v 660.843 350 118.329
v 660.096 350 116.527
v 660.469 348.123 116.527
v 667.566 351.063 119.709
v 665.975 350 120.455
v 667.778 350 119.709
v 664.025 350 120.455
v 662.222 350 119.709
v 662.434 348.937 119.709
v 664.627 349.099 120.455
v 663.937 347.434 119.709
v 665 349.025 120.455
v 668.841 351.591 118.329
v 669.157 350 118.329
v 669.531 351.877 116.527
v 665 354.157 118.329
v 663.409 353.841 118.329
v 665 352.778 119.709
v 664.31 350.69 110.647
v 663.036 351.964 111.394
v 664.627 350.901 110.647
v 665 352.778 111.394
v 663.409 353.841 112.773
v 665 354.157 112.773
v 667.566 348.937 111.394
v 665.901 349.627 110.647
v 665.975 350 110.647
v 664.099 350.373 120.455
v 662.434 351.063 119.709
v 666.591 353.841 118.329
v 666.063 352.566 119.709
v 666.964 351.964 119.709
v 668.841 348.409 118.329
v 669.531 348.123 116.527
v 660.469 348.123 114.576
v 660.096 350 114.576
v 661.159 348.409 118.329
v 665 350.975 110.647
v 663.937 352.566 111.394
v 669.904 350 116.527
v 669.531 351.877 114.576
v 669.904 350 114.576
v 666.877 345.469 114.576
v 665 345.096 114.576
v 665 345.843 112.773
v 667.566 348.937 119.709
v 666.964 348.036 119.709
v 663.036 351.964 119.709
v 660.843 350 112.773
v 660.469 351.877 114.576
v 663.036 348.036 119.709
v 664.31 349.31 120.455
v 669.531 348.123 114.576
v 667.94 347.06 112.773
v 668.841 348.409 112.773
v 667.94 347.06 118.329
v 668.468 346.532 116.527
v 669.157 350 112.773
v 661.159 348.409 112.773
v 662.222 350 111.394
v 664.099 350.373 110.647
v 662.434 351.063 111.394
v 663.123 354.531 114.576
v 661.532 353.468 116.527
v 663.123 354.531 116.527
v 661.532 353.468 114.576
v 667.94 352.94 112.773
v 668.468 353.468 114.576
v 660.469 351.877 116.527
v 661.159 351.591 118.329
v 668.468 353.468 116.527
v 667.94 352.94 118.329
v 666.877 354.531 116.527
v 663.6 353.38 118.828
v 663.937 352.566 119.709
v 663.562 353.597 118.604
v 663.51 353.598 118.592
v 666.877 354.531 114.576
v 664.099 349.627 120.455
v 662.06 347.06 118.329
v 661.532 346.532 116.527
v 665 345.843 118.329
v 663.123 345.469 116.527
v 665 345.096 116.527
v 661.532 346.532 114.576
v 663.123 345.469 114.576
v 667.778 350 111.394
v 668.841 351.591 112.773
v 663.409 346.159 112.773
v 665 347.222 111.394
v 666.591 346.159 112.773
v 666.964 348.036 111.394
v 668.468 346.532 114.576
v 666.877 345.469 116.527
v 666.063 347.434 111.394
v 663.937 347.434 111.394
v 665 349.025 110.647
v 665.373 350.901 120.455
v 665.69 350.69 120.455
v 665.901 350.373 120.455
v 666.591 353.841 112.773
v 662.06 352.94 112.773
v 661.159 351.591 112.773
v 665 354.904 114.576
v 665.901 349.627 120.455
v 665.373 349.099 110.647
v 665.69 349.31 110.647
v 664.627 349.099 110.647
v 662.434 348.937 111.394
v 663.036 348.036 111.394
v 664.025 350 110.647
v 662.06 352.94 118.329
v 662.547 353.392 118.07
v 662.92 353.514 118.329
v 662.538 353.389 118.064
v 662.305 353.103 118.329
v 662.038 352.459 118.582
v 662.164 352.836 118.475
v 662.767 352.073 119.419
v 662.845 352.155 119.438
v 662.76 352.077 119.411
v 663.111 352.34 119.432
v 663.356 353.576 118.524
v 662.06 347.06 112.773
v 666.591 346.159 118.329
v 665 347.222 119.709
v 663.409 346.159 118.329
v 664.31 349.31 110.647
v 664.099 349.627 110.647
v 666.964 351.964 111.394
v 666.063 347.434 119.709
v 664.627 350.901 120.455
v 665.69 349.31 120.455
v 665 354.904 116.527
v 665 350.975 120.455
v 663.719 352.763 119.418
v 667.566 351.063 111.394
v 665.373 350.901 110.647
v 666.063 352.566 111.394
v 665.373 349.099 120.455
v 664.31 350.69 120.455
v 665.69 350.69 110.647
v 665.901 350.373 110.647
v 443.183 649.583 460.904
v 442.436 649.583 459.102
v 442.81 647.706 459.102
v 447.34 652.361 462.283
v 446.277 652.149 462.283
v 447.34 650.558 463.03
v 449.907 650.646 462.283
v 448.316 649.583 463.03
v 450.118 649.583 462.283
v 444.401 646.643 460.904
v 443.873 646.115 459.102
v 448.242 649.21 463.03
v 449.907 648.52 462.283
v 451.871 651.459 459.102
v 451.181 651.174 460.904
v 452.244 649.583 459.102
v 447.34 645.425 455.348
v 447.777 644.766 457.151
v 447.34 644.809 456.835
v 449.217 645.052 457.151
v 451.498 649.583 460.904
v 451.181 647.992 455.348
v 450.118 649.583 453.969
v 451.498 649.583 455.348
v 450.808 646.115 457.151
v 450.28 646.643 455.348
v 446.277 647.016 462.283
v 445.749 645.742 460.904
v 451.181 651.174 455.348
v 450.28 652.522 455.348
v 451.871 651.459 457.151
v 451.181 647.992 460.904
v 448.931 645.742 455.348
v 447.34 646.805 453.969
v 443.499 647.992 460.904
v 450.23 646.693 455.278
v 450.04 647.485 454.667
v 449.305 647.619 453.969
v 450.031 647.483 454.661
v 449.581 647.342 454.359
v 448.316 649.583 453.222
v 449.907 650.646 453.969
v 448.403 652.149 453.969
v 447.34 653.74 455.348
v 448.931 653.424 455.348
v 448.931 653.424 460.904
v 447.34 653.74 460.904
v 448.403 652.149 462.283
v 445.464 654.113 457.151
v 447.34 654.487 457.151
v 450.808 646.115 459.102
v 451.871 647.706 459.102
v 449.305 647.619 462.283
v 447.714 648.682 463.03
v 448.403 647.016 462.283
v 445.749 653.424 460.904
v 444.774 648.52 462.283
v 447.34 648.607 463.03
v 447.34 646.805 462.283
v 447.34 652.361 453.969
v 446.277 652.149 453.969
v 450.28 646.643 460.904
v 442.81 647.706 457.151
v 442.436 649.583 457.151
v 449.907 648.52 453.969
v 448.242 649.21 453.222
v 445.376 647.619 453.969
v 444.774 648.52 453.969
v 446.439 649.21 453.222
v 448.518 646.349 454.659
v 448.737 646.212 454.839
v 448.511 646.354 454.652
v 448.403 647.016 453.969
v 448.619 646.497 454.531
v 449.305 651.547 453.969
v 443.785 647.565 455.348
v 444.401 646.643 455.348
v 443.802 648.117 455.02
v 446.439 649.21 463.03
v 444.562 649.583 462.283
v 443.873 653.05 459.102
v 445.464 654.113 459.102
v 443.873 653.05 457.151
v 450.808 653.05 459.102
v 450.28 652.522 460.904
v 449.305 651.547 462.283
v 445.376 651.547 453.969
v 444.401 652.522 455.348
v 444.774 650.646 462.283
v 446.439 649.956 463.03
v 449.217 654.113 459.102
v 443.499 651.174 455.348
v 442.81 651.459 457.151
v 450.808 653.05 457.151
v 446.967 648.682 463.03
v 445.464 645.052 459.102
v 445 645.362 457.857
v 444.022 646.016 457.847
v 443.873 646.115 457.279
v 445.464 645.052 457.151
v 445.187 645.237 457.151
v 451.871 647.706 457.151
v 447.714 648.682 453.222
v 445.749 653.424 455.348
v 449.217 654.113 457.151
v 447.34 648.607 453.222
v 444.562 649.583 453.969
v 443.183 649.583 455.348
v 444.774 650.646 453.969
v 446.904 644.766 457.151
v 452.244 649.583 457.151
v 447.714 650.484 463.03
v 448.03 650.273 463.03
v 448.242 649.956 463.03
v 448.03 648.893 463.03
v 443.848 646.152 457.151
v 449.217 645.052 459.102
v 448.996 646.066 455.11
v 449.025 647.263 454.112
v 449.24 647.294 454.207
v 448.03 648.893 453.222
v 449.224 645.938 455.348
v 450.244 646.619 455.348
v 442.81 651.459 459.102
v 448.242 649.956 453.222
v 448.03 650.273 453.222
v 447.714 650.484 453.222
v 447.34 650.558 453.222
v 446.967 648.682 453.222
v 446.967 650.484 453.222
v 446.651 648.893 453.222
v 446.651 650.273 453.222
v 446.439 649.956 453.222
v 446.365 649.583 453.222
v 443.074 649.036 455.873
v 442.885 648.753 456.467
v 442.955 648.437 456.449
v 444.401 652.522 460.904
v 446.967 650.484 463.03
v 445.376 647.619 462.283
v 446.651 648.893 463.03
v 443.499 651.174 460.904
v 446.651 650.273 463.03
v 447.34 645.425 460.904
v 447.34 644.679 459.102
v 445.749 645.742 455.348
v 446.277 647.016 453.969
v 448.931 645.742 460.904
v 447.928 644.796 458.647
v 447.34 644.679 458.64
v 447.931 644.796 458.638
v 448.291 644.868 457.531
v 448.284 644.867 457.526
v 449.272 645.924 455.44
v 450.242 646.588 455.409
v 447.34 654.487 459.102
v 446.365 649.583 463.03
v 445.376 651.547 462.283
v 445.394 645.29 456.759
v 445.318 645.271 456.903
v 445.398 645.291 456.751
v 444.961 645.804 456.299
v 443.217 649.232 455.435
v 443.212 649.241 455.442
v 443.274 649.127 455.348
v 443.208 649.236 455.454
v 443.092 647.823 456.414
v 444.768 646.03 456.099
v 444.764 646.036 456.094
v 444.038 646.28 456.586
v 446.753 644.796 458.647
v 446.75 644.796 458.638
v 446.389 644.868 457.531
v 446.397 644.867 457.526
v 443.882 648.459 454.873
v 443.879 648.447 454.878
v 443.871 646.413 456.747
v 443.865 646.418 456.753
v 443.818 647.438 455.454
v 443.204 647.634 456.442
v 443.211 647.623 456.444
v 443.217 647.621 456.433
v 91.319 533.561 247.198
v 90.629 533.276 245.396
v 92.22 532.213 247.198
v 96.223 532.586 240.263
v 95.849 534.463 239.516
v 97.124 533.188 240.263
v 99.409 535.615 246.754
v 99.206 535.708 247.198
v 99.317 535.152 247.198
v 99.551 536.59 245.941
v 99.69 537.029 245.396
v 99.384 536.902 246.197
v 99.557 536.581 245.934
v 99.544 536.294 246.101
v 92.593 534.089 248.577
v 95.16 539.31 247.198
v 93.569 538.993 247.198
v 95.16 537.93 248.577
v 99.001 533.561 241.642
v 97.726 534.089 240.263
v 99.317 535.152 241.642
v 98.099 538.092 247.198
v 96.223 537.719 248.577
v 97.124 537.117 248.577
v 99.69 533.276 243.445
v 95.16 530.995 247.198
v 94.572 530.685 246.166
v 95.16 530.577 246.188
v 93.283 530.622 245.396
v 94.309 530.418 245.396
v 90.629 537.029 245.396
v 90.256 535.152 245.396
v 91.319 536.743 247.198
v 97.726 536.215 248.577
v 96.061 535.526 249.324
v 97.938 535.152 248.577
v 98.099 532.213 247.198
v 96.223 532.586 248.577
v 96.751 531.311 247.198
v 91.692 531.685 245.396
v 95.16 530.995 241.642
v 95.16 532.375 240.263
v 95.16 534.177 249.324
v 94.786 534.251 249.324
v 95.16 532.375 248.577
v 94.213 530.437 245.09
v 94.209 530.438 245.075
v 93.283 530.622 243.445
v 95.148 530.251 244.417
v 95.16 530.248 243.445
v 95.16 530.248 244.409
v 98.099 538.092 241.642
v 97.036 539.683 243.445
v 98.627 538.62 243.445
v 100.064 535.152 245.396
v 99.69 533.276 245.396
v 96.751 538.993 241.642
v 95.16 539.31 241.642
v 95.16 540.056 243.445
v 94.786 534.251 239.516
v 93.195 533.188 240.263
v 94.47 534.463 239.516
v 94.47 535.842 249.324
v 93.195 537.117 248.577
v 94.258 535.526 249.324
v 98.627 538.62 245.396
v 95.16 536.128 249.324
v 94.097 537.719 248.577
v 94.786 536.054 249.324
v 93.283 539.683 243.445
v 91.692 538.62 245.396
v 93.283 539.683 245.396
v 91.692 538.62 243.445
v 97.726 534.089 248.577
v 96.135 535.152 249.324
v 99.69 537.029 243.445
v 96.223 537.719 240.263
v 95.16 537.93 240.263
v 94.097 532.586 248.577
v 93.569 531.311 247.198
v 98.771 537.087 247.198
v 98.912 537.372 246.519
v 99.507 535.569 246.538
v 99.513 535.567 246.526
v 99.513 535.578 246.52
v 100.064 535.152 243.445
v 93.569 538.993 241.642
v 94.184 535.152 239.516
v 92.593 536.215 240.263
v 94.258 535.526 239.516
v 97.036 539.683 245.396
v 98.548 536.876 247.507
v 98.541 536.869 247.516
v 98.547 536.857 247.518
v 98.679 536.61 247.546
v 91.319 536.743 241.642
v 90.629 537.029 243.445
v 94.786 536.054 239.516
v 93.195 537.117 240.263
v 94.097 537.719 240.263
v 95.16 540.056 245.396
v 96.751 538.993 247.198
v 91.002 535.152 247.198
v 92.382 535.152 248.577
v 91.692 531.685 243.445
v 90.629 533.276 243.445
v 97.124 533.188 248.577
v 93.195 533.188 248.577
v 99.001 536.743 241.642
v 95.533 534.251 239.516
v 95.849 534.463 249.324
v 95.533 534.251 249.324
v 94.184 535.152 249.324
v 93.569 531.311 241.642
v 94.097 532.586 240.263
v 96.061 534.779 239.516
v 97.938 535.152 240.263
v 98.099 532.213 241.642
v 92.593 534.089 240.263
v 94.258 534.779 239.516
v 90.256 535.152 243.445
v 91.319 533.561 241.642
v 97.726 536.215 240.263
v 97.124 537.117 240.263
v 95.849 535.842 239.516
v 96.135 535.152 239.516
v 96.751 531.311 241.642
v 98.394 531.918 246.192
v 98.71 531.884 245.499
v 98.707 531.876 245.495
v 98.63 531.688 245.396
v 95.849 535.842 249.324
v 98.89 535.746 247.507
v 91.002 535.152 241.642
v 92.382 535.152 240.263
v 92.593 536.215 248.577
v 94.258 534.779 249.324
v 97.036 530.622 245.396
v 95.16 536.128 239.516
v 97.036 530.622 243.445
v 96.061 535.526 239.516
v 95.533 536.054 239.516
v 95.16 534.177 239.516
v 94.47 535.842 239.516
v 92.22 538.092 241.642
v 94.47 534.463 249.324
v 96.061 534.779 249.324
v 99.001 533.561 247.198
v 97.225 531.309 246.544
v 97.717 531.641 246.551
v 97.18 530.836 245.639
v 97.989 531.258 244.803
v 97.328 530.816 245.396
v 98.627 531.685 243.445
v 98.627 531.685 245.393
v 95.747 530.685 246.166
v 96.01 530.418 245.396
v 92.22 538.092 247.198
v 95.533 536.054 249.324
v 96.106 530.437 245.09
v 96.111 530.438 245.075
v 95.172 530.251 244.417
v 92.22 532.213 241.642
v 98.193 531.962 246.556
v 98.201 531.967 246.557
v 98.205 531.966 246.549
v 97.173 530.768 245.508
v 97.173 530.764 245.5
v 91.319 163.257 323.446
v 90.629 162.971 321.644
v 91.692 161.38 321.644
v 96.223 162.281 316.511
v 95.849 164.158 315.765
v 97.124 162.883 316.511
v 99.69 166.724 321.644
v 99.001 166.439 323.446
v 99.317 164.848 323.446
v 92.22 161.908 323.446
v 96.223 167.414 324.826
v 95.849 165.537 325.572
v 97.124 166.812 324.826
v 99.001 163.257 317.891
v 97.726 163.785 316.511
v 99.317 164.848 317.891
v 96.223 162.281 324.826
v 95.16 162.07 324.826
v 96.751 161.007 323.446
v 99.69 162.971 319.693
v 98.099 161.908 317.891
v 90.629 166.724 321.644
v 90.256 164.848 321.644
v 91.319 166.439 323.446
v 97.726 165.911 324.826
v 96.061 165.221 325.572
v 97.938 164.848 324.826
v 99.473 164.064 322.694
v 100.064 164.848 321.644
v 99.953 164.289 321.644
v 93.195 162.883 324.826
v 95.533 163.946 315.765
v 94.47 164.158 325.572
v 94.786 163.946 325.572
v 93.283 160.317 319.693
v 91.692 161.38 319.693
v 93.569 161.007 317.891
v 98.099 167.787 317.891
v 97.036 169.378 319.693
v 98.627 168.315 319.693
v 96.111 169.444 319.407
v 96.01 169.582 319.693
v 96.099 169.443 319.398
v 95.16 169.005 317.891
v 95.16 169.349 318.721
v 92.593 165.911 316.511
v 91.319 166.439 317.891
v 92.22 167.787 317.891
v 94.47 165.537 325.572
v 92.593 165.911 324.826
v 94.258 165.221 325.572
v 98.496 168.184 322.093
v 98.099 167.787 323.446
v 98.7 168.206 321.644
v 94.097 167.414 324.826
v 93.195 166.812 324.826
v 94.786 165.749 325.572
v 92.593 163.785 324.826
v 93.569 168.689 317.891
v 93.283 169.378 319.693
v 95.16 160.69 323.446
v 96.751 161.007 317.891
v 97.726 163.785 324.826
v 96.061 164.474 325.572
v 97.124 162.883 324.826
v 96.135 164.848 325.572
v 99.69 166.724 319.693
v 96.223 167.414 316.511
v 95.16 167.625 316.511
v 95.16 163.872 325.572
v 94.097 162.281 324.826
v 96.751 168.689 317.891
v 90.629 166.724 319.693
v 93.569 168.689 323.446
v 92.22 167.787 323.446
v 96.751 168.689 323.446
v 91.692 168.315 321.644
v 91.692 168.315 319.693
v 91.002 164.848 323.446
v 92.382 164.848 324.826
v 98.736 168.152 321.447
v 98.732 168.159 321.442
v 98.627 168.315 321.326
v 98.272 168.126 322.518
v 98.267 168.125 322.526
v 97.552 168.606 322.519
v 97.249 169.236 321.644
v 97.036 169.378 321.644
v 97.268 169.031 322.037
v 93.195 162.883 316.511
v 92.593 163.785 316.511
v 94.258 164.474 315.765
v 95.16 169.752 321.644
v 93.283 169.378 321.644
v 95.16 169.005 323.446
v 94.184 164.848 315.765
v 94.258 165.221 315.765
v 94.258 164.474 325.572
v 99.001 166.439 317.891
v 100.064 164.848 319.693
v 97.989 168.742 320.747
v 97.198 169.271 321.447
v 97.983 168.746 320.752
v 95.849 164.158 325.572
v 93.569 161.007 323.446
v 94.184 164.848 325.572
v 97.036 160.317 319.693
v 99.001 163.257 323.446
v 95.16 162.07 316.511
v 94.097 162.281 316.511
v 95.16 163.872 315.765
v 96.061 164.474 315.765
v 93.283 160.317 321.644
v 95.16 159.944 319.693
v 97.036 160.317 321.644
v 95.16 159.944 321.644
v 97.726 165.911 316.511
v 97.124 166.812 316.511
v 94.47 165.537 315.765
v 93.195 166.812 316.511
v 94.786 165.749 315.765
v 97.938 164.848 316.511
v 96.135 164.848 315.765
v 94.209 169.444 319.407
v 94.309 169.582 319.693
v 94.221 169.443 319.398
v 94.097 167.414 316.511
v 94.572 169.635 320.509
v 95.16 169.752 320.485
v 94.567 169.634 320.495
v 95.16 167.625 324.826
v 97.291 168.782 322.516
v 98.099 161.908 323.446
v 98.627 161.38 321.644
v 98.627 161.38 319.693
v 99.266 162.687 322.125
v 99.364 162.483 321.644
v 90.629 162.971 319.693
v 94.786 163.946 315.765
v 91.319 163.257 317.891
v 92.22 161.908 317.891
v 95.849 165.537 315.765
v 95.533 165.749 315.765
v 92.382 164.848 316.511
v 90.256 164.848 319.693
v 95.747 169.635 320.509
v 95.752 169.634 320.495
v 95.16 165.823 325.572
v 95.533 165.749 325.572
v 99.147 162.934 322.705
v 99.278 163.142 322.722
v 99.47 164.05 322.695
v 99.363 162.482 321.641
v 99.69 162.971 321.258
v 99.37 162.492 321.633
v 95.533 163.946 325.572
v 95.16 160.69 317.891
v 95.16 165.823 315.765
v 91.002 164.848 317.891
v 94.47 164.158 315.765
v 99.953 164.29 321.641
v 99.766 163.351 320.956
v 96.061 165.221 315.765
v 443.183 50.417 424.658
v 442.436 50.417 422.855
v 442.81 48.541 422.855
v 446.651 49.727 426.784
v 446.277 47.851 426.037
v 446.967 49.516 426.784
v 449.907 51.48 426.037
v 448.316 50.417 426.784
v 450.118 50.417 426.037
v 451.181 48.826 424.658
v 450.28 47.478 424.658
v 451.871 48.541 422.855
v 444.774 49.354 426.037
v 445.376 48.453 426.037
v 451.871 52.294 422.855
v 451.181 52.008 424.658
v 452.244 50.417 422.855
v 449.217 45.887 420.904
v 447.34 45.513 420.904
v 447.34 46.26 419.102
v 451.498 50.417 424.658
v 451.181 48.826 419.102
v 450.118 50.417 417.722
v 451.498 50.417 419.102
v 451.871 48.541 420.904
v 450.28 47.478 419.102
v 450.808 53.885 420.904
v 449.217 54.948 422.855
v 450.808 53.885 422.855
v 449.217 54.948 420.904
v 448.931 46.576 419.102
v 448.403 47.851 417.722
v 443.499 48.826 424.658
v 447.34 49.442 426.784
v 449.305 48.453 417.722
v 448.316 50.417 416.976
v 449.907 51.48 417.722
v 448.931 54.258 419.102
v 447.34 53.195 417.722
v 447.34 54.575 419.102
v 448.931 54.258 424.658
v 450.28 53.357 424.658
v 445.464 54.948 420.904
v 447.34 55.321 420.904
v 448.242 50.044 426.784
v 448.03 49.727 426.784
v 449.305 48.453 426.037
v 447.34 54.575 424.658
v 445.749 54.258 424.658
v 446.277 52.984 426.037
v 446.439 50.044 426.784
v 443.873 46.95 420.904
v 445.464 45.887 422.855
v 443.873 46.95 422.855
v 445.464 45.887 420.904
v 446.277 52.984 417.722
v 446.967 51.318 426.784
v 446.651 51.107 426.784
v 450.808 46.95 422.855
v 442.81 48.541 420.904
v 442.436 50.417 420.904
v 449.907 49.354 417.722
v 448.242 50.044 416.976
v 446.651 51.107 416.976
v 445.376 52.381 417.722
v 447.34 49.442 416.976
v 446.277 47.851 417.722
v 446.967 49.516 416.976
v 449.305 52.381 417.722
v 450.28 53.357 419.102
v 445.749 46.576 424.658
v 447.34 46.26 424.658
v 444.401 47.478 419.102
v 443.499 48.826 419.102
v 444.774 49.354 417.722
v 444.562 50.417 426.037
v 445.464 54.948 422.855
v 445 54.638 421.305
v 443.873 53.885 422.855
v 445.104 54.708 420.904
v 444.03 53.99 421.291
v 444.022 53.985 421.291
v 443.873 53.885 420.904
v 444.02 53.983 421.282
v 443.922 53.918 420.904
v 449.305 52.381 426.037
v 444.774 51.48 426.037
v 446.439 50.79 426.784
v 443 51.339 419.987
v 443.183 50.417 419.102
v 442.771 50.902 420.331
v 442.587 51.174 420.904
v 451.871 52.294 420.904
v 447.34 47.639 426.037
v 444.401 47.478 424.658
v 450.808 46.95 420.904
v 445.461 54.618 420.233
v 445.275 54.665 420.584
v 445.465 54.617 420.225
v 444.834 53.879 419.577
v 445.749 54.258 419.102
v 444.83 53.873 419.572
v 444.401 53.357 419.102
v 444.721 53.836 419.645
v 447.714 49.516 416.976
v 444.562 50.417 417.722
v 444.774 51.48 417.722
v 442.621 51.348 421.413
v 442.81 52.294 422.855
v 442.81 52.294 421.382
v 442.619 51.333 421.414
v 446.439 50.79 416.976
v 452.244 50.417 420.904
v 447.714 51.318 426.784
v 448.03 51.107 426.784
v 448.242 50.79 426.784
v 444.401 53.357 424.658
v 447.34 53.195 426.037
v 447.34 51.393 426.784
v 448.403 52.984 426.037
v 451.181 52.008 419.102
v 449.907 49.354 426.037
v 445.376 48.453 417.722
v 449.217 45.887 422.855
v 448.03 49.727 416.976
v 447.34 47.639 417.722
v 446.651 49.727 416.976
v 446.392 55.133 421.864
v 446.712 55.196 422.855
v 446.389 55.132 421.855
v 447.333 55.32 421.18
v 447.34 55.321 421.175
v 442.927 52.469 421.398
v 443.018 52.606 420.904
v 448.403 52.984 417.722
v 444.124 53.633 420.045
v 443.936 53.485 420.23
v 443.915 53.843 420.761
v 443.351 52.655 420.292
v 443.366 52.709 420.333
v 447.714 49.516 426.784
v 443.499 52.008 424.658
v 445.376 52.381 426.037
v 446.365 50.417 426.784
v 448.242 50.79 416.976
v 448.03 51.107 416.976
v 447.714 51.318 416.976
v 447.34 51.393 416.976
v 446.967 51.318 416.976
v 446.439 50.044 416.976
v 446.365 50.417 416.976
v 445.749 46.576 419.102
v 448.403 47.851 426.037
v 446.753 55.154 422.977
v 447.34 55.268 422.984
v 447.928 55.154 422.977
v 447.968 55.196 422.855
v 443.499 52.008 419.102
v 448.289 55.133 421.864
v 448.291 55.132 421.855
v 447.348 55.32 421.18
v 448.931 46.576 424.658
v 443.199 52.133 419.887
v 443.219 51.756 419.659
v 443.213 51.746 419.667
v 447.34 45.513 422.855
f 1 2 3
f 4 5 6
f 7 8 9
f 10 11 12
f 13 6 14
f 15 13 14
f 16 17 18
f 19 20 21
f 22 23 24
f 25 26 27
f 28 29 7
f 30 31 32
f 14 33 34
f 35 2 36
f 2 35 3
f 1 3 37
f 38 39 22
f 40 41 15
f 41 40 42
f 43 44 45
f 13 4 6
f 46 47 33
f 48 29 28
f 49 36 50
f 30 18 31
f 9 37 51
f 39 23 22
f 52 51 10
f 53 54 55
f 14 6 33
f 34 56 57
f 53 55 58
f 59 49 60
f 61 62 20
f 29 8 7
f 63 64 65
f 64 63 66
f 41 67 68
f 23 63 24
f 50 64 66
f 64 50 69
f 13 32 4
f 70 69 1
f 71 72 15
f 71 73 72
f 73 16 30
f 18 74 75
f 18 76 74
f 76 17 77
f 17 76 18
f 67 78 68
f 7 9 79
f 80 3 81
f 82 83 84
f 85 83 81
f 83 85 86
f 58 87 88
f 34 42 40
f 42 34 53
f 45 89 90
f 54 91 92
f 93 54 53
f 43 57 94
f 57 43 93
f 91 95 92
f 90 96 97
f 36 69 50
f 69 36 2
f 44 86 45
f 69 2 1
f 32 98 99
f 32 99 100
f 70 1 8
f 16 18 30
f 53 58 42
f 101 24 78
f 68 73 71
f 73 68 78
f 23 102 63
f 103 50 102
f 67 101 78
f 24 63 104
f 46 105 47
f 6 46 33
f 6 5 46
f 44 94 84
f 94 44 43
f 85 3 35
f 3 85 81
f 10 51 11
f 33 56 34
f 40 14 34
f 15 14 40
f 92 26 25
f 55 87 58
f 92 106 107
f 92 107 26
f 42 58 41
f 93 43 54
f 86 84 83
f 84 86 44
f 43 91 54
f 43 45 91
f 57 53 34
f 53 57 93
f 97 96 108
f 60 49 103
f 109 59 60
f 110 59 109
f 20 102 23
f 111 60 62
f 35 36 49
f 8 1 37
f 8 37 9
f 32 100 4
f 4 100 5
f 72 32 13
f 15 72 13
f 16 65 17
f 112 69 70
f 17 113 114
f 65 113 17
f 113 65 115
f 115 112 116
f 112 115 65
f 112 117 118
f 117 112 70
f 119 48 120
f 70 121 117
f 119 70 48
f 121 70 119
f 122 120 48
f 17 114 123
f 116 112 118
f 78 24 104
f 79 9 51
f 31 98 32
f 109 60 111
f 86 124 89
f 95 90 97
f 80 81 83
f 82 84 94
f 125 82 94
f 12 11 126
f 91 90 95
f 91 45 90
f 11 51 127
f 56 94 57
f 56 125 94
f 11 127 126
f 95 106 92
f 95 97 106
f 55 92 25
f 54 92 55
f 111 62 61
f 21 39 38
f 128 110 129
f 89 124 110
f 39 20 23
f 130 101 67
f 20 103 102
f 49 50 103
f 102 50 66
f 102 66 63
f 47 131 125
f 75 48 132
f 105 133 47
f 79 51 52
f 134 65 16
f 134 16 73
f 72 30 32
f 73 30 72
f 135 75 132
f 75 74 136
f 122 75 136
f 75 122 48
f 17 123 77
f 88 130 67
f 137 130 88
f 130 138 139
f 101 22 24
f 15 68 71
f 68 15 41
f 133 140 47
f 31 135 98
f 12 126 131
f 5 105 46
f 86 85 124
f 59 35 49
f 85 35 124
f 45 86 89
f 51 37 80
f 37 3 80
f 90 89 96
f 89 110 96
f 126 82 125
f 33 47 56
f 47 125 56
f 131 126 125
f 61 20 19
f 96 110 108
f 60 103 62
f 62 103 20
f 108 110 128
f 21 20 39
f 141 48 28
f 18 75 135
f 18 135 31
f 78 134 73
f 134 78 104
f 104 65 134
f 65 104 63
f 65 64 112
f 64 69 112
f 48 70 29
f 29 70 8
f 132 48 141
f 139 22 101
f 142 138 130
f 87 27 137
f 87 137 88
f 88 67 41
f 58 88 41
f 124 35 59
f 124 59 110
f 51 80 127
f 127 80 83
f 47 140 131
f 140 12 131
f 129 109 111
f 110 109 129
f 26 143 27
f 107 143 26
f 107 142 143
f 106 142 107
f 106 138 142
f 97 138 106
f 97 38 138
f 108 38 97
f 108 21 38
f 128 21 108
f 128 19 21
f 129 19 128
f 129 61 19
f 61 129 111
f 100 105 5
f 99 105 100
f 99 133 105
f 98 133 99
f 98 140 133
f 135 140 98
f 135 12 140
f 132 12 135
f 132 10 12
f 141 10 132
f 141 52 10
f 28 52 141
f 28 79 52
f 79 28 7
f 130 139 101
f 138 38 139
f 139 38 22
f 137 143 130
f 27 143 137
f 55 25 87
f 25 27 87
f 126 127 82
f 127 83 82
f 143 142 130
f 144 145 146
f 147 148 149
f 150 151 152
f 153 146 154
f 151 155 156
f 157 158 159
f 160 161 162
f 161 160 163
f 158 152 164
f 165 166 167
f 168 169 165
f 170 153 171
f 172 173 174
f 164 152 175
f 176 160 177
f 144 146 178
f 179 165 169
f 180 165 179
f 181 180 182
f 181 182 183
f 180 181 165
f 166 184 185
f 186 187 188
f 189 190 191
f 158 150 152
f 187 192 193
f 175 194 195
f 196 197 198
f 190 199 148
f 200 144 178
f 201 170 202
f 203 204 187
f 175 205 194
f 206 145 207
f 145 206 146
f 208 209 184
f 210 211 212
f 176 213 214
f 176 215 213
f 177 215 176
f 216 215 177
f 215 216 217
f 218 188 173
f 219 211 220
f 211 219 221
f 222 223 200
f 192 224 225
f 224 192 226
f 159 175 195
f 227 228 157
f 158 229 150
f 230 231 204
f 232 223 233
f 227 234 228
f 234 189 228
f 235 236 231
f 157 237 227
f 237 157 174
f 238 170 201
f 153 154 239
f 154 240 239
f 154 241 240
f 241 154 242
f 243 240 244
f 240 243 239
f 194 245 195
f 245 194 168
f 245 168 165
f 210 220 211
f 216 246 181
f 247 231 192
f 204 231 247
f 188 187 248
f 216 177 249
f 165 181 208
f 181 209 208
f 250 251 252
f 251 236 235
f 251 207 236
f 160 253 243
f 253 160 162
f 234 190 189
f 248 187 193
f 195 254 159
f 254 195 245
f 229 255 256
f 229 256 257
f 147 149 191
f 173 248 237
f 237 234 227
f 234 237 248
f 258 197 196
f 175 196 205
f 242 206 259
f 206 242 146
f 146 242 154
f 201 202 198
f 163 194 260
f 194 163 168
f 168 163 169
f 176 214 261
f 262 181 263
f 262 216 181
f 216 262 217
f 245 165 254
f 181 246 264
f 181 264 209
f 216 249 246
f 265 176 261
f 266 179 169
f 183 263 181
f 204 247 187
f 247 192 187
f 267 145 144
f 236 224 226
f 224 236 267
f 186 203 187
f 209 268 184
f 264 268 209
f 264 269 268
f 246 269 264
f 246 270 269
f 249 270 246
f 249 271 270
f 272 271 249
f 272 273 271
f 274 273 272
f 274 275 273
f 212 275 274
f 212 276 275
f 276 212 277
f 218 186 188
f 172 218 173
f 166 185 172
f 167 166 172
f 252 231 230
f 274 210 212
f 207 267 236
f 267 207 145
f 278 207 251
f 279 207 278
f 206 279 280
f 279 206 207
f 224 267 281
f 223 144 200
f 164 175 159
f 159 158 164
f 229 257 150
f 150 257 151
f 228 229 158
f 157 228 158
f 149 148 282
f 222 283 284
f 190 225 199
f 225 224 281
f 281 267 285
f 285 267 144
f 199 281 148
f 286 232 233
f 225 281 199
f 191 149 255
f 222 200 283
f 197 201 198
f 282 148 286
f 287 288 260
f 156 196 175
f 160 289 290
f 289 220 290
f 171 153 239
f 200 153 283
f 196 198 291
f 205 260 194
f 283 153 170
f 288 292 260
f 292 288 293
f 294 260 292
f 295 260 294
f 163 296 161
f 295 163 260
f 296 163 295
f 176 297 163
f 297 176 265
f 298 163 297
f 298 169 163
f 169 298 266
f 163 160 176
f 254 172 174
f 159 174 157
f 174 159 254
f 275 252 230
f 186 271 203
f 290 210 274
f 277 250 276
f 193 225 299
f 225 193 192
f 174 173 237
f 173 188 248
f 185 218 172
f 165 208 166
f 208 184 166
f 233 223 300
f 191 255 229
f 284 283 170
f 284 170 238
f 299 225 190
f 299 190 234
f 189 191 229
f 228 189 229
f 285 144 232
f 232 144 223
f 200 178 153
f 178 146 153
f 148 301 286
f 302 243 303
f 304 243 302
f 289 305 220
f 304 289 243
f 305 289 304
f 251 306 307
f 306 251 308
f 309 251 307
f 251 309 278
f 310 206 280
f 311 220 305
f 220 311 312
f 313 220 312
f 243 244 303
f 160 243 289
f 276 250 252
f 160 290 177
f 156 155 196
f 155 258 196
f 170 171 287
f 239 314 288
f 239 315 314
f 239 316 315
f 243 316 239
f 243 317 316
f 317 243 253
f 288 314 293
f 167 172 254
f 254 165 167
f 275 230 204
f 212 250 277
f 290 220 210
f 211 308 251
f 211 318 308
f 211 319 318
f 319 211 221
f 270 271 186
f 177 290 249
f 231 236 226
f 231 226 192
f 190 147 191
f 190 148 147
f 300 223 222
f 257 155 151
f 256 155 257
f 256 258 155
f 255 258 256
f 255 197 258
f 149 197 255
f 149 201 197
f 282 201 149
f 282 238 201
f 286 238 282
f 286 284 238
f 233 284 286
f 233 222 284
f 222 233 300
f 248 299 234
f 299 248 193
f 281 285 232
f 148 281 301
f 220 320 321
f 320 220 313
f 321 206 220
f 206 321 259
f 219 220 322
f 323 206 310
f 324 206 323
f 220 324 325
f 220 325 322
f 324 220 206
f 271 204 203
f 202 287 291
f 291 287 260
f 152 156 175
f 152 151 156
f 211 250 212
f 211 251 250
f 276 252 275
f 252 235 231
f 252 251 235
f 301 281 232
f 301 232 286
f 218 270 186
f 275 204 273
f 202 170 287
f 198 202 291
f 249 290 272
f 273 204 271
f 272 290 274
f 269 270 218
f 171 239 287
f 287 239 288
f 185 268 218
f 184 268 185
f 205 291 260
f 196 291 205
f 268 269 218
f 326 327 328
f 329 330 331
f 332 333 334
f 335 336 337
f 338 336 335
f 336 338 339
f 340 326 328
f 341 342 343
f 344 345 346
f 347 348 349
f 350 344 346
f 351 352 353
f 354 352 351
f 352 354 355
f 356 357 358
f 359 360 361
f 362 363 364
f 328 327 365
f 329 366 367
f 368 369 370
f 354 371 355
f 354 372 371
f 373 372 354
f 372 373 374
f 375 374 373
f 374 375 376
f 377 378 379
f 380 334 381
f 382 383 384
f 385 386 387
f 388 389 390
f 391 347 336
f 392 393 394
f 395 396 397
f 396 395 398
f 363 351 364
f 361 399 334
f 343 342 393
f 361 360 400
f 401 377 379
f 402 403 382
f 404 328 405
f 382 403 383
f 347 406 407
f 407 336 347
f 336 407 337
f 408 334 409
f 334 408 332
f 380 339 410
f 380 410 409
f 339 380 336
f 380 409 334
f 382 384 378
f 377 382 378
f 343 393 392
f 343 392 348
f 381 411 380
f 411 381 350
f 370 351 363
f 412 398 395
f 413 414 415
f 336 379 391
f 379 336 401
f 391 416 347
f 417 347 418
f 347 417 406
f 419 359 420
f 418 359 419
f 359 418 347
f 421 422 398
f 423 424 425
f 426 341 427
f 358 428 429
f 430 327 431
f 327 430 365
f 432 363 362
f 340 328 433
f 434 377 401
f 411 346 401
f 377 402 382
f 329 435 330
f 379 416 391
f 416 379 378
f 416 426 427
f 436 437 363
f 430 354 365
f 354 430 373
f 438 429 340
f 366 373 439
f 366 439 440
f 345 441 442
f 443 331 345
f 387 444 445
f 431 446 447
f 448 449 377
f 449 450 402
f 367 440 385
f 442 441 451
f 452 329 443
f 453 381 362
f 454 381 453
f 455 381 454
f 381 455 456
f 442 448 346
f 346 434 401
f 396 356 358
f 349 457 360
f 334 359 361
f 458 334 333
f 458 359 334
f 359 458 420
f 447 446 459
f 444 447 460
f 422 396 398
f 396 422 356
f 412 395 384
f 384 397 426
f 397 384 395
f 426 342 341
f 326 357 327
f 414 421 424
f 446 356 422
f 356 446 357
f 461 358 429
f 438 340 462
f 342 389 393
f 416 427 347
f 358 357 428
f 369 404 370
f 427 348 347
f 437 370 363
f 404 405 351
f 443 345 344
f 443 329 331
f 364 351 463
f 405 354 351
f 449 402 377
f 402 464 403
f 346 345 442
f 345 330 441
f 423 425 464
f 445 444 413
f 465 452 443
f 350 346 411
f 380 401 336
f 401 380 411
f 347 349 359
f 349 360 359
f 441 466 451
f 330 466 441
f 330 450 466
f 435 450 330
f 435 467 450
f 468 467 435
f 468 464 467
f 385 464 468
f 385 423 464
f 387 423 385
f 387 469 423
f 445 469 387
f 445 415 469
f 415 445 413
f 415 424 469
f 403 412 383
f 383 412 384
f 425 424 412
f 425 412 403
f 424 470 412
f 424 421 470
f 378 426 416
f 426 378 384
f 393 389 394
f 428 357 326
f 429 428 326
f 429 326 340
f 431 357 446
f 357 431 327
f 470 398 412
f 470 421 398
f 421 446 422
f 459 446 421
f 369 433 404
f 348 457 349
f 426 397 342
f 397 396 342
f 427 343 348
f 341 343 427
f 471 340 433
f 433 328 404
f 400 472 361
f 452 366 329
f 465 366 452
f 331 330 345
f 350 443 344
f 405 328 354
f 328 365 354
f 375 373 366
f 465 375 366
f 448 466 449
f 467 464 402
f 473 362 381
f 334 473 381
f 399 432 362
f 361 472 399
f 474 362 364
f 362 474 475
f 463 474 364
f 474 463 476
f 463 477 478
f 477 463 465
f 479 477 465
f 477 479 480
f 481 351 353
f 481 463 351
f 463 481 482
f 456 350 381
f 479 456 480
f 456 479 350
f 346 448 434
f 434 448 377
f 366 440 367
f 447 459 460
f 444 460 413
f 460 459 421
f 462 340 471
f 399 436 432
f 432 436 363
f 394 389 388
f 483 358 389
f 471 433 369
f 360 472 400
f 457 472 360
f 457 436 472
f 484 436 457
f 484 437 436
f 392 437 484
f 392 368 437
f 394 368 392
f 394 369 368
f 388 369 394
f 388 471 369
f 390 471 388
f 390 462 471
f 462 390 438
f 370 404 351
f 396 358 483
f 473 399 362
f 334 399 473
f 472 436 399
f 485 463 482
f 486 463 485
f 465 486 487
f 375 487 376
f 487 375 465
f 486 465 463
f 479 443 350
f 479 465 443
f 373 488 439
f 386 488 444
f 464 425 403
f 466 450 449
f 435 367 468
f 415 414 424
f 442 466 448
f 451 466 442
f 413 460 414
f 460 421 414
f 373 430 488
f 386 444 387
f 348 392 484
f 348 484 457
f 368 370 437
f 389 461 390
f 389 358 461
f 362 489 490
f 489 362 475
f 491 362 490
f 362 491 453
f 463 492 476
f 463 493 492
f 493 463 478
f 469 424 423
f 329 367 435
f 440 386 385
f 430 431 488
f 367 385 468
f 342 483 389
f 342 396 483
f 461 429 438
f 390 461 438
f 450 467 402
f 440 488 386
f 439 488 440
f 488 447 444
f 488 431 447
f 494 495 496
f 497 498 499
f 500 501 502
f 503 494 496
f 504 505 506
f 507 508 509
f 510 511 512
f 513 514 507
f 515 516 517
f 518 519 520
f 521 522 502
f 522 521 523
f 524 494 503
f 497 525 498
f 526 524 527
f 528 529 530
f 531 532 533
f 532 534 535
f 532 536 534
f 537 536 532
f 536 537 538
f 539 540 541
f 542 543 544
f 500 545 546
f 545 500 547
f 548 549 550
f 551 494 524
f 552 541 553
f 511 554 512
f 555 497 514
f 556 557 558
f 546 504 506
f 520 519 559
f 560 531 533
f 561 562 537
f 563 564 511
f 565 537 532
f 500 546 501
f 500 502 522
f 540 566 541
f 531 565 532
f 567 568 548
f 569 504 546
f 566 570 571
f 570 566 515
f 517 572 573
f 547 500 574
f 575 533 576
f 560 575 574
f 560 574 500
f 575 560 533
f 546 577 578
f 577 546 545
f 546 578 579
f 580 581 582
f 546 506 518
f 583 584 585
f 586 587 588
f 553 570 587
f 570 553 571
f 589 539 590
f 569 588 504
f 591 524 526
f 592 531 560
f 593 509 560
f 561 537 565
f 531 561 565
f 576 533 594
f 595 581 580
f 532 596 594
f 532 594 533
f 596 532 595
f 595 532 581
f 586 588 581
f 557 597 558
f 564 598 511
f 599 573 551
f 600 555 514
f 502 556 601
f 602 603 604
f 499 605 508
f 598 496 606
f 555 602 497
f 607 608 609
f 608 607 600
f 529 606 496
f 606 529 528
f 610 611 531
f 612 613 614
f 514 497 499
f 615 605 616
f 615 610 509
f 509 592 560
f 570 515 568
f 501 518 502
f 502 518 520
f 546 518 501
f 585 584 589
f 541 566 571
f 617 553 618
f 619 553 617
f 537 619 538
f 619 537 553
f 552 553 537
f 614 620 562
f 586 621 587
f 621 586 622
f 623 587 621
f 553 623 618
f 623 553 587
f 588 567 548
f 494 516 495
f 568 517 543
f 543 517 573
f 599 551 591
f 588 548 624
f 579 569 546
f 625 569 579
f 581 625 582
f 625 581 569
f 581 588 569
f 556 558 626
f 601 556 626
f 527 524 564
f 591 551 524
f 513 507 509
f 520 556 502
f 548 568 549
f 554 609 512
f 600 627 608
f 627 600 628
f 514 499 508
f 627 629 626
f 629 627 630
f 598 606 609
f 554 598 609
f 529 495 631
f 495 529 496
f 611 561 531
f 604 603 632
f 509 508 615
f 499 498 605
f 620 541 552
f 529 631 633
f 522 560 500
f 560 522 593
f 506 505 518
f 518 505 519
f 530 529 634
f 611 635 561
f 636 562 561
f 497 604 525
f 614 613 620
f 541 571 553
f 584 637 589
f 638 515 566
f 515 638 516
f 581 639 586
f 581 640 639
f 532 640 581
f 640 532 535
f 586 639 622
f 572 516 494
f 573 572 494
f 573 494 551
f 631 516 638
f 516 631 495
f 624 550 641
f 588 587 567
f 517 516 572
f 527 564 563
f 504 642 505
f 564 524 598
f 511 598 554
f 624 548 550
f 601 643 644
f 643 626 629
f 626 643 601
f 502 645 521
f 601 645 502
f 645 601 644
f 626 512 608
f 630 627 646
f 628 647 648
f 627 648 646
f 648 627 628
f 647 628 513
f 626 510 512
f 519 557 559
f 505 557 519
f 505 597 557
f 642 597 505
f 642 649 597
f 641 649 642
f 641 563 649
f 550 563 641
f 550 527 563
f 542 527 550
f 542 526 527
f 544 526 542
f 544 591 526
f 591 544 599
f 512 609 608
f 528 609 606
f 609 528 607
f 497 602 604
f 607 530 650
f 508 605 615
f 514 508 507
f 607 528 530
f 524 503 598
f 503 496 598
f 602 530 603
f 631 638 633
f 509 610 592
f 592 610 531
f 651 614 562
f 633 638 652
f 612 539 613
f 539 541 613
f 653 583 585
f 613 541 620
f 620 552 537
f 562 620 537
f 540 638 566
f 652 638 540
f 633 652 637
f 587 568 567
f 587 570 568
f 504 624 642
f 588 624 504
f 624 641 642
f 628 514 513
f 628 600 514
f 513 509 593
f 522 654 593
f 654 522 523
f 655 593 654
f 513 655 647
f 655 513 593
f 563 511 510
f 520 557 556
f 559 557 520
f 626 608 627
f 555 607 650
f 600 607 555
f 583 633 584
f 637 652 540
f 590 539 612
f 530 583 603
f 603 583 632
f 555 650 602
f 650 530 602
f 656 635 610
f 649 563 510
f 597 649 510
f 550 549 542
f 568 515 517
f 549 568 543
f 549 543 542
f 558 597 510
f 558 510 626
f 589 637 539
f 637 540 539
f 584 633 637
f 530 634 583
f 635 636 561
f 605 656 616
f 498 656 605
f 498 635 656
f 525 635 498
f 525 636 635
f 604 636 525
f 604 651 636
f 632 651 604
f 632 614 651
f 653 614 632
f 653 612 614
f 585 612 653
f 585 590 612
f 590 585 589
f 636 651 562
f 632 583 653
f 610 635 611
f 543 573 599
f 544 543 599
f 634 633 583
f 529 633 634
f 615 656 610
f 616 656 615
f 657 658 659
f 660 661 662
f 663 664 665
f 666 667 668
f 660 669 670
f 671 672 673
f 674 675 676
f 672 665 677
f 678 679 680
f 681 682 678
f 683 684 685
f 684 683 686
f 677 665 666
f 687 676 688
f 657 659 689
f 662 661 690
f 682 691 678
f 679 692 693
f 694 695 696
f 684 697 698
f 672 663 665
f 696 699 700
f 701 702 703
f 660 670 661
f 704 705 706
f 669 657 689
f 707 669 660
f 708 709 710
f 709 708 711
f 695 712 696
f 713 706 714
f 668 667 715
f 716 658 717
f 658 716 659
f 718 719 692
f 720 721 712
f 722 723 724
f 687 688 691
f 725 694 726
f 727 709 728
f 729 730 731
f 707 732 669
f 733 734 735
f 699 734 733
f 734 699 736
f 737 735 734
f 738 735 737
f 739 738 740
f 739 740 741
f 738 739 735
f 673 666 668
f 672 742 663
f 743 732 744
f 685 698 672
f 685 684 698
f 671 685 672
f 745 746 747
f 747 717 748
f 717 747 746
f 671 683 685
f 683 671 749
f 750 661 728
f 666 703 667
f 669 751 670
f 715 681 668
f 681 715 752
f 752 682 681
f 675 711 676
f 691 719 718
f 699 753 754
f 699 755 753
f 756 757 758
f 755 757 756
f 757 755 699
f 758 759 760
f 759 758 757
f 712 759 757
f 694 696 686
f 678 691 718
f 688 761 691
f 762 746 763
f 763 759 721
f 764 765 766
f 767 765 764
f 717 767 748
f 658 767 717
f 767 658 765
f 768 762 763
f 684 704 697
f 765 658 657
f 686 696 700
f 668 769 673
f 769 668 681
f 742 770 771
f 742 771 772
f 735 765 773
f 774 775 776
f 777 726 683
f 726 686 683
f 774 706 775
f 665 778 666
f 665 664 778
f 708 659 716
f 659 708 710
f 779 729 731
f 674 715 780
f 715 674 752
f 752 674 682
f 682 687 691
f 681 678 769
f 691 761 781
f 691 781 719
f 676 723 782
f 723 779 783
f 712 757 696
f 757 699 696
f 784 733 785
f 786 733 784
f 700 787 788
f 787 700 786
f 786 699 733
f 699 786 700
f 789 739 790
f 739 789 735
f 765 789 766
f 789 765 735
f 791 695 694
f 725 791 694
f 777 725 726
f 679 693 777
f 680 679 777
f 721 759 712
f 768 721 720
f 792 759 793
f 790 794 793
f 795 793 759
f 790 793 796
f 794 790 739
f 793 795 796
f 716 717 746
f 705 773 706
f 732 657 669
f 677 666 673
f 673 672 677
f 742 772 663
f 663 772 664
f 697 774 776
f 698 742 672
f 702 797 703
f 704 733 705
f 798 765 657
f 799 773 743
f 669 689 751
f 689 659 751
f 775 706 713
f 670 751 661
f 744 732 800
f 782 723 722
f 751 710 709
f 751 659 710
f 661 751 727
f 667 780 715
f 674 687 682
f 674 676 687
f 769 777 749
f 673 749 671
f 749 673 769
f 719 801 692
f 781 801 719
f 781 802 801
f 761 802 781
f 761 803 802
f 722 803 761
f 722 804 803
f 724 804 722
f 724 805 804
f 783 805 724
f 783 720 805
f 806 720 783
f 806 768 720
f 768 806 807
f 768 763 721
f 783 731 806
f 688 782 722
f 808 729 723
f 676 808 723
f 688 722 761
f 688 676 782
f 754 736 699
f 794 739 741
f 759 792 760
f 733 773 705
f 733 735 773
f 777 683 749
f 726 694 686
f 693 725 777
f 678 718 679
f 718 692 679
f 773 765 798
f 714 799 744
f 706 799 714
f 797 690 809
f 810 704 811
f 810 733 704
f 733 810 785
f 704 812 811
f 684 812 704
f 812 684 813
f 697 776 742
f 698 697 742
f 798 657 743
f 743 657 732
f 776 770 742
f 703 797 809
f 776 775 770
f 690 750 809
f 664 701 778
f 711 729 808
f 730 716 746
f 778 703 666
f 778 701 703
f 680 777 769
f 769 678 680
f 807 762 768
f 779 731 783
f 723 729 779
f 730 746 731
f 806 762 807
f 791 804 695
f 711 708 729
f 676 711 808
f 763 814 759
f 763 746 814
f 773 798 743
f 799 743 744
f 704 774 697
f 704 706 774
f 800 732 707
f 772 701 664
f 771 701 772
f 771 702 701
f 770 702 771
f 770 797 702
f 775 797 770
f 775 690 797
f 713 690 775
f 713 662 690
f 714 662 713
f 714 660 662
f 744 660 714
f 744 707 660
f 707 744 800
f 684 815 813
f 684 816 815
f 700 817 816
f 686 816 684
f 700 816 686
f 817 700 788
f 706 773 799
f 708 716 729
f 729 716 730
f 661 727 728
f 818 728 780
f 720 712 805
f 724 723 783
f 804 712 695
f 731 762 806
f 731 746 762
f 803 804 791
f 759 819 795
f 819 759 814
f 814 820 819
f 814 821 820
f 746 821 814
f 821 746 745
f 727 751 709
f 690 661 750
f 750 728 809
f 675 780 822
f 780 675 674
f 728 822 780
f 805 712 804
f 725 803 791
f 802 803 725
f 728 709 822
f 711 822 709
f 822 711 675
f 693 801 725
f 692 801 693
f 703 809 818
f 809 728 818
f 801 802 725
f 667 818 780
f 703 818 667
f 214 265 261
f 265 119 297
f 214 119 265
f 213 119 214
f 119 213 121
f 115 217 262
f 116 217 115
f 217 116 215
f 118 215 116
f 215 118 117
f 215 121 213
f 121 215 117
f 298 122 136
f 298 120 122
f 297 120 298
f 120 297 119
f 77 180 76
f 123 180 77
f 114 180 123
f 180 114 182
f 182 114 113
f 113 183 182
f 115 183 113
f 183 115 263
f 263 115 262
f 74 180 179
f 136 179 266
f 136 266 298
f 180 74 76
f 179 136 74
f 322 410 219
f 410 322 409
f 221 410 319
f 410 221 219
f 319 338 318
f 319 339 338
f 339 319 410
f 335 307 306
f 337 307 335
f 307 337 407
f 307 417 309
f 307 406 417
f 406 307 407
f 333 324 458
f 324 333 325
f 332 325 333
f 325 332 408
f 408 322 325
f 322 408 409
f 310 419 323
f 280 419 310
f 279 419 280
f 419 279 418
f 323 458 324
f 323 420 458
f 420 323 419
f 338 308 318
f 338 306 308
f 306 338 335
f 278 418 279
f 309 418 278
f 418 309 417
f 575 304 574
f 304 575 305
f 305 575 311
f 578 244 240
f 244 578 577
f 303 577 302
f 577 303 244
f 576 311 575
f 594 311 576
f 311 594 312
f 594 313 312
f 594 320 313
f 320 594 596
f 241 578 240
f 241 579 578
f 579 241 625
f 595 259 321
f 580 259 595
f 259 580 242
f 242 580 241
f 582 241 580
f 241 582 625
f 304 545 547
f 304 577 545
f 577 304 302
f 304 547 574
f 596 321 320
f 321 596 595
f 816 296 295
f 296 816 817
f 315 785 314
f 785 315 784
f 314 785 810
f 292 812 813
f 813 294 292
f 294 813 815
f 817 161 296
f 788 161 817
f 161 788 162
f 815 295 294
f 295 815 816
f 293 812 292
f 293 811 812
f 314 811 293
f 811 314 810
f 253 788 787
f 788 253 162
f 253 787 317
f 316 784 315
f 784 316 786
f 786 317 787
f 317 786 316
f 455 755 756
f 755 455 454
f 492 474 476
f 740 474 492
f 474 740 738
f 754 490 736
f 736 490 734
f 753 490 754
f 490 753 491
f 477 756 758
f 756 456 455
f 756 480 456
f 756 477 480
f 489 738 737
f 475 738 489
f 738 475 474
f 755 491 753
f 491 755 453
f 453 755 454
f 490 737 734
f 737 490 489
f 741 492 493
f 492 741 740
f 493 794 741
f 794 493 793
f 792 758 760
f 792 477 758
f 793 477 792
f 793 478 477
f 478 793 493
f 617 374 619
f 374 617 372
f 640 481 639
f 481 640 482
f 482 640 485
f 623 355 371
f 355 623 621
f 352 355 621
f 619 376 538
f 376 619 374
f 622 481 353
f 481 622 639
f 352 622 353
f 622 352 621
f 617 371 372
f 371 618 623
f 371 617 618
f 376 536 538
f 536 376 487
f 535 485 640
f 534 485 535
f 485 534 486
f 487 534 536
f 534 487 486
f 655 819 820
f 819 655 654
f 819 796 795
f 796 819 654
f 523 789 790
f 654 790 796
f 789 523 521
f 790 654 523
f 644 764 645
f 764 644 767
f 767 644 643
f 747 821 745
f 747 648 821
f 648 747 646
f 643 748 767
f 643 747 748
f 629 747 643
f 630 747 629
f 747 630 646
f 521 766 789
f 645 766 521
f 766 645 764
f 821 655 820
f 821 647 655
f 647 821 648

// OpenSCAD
// Define the node renderer.
//  Parameters:
//  n - the index in the nodes table of the node to render
module renderNode(n) {
    translate(nodeCoordinates[n]) sphere(r = 5, center = true);
};

// Define the edge renderer.
//  Parameters:
//  src - the index in the nodes table of the source node
//  dst - the index in the nodes table of the destination node
module renderEdge(src, dst) {

    // Find the source and destination node coordinates.
    srcNode  = nodeCoordinates[src];
    destNode = nodeCoordinates[dst];

    // Find the vector connecting the source and destination node coordinates.
	diff = [destNode[0] - srcNode[0], destNode[1] - srcNode[1], destNode[2] - srcNode[2]];

    // Find the distance between the source and destination node coordinates.
	length = sqrt(pow(diff[0], 2) + pow(diff[1], 2) + pow(diff[2], 2));

    // Move to the starting point.
	translate(diff / 2 + srcNode) {

        // Rotate around the Z axis.
        rotate([0, 0, atan2(diff[1], diff[0])]) {

            // Rotate around the Y axis.
            rotate([0, atan2(sqrt(pow(diff[0], 2) + pow(diff[1], 2)), diff[2]), 0]) {

                // Draw the edge.
                cylinder(h = length, r = 1.0, center = true);

            }

        }

    }

};

// Define the list of node coordinates.
nodeCoordinates = [
[665.0, 350.0, 115.55123658929773], 
[447.3403532281084, 649.5828026329734, 458.12608176178617], 
[95.1596467718916, 535.1523544721291, 244.42013822996074], 
[95.15964677189154, 164.847645527871, 320.6684697845816], 
[447.34035322810837, 50.417197367026574, 421.8797364660057]
];

// Define the list of node identifiers.
nodeIdentifiers = [
[0, 0], 
[1, 1], 
[2, 2], 
[3, 3], 
[4, 4]
];

// Define the list of edges.
edgeIdentifiers = [
[1, 0, 0], 
[2, 0, 1], 
[3, 1, 0], 
[4, 1, 2], 
[5, 1, 3], 
[6, 1, 4], 
[7, 1, 0], 
[8, 1, 2], 
[9, 1, 3], 
[10, 1, 4], 
[11, 3, 1], 
[12, 3, 3], 
[13, 1, 2], 
[14, 1, 3], 
[15, 2, 1], 
[16, 2, 4], 
[17, 3, 1], 
[18, 3, 2], 
[19, 3, 3], 
[20, 3, 4], 
[21, 4, 1], 
[22, 4, 4]
];

// Render the network nodes.
for (nodeIndex = [0 : len(nodeCoordinates) - 1] ) {
renderNode(nodeIndex);
};

// Render the network edges.
for (edgeIndex = [0 : len(edgeIdentifiers) - 1] ) {
renderEdge(
    lookup(edgeIdentifiers[edgeIndex][1], nodeIdentifiers),
    lookup(edgeIdentifiers[edgeIndex][2], nodeIdentifiers)
);
};
